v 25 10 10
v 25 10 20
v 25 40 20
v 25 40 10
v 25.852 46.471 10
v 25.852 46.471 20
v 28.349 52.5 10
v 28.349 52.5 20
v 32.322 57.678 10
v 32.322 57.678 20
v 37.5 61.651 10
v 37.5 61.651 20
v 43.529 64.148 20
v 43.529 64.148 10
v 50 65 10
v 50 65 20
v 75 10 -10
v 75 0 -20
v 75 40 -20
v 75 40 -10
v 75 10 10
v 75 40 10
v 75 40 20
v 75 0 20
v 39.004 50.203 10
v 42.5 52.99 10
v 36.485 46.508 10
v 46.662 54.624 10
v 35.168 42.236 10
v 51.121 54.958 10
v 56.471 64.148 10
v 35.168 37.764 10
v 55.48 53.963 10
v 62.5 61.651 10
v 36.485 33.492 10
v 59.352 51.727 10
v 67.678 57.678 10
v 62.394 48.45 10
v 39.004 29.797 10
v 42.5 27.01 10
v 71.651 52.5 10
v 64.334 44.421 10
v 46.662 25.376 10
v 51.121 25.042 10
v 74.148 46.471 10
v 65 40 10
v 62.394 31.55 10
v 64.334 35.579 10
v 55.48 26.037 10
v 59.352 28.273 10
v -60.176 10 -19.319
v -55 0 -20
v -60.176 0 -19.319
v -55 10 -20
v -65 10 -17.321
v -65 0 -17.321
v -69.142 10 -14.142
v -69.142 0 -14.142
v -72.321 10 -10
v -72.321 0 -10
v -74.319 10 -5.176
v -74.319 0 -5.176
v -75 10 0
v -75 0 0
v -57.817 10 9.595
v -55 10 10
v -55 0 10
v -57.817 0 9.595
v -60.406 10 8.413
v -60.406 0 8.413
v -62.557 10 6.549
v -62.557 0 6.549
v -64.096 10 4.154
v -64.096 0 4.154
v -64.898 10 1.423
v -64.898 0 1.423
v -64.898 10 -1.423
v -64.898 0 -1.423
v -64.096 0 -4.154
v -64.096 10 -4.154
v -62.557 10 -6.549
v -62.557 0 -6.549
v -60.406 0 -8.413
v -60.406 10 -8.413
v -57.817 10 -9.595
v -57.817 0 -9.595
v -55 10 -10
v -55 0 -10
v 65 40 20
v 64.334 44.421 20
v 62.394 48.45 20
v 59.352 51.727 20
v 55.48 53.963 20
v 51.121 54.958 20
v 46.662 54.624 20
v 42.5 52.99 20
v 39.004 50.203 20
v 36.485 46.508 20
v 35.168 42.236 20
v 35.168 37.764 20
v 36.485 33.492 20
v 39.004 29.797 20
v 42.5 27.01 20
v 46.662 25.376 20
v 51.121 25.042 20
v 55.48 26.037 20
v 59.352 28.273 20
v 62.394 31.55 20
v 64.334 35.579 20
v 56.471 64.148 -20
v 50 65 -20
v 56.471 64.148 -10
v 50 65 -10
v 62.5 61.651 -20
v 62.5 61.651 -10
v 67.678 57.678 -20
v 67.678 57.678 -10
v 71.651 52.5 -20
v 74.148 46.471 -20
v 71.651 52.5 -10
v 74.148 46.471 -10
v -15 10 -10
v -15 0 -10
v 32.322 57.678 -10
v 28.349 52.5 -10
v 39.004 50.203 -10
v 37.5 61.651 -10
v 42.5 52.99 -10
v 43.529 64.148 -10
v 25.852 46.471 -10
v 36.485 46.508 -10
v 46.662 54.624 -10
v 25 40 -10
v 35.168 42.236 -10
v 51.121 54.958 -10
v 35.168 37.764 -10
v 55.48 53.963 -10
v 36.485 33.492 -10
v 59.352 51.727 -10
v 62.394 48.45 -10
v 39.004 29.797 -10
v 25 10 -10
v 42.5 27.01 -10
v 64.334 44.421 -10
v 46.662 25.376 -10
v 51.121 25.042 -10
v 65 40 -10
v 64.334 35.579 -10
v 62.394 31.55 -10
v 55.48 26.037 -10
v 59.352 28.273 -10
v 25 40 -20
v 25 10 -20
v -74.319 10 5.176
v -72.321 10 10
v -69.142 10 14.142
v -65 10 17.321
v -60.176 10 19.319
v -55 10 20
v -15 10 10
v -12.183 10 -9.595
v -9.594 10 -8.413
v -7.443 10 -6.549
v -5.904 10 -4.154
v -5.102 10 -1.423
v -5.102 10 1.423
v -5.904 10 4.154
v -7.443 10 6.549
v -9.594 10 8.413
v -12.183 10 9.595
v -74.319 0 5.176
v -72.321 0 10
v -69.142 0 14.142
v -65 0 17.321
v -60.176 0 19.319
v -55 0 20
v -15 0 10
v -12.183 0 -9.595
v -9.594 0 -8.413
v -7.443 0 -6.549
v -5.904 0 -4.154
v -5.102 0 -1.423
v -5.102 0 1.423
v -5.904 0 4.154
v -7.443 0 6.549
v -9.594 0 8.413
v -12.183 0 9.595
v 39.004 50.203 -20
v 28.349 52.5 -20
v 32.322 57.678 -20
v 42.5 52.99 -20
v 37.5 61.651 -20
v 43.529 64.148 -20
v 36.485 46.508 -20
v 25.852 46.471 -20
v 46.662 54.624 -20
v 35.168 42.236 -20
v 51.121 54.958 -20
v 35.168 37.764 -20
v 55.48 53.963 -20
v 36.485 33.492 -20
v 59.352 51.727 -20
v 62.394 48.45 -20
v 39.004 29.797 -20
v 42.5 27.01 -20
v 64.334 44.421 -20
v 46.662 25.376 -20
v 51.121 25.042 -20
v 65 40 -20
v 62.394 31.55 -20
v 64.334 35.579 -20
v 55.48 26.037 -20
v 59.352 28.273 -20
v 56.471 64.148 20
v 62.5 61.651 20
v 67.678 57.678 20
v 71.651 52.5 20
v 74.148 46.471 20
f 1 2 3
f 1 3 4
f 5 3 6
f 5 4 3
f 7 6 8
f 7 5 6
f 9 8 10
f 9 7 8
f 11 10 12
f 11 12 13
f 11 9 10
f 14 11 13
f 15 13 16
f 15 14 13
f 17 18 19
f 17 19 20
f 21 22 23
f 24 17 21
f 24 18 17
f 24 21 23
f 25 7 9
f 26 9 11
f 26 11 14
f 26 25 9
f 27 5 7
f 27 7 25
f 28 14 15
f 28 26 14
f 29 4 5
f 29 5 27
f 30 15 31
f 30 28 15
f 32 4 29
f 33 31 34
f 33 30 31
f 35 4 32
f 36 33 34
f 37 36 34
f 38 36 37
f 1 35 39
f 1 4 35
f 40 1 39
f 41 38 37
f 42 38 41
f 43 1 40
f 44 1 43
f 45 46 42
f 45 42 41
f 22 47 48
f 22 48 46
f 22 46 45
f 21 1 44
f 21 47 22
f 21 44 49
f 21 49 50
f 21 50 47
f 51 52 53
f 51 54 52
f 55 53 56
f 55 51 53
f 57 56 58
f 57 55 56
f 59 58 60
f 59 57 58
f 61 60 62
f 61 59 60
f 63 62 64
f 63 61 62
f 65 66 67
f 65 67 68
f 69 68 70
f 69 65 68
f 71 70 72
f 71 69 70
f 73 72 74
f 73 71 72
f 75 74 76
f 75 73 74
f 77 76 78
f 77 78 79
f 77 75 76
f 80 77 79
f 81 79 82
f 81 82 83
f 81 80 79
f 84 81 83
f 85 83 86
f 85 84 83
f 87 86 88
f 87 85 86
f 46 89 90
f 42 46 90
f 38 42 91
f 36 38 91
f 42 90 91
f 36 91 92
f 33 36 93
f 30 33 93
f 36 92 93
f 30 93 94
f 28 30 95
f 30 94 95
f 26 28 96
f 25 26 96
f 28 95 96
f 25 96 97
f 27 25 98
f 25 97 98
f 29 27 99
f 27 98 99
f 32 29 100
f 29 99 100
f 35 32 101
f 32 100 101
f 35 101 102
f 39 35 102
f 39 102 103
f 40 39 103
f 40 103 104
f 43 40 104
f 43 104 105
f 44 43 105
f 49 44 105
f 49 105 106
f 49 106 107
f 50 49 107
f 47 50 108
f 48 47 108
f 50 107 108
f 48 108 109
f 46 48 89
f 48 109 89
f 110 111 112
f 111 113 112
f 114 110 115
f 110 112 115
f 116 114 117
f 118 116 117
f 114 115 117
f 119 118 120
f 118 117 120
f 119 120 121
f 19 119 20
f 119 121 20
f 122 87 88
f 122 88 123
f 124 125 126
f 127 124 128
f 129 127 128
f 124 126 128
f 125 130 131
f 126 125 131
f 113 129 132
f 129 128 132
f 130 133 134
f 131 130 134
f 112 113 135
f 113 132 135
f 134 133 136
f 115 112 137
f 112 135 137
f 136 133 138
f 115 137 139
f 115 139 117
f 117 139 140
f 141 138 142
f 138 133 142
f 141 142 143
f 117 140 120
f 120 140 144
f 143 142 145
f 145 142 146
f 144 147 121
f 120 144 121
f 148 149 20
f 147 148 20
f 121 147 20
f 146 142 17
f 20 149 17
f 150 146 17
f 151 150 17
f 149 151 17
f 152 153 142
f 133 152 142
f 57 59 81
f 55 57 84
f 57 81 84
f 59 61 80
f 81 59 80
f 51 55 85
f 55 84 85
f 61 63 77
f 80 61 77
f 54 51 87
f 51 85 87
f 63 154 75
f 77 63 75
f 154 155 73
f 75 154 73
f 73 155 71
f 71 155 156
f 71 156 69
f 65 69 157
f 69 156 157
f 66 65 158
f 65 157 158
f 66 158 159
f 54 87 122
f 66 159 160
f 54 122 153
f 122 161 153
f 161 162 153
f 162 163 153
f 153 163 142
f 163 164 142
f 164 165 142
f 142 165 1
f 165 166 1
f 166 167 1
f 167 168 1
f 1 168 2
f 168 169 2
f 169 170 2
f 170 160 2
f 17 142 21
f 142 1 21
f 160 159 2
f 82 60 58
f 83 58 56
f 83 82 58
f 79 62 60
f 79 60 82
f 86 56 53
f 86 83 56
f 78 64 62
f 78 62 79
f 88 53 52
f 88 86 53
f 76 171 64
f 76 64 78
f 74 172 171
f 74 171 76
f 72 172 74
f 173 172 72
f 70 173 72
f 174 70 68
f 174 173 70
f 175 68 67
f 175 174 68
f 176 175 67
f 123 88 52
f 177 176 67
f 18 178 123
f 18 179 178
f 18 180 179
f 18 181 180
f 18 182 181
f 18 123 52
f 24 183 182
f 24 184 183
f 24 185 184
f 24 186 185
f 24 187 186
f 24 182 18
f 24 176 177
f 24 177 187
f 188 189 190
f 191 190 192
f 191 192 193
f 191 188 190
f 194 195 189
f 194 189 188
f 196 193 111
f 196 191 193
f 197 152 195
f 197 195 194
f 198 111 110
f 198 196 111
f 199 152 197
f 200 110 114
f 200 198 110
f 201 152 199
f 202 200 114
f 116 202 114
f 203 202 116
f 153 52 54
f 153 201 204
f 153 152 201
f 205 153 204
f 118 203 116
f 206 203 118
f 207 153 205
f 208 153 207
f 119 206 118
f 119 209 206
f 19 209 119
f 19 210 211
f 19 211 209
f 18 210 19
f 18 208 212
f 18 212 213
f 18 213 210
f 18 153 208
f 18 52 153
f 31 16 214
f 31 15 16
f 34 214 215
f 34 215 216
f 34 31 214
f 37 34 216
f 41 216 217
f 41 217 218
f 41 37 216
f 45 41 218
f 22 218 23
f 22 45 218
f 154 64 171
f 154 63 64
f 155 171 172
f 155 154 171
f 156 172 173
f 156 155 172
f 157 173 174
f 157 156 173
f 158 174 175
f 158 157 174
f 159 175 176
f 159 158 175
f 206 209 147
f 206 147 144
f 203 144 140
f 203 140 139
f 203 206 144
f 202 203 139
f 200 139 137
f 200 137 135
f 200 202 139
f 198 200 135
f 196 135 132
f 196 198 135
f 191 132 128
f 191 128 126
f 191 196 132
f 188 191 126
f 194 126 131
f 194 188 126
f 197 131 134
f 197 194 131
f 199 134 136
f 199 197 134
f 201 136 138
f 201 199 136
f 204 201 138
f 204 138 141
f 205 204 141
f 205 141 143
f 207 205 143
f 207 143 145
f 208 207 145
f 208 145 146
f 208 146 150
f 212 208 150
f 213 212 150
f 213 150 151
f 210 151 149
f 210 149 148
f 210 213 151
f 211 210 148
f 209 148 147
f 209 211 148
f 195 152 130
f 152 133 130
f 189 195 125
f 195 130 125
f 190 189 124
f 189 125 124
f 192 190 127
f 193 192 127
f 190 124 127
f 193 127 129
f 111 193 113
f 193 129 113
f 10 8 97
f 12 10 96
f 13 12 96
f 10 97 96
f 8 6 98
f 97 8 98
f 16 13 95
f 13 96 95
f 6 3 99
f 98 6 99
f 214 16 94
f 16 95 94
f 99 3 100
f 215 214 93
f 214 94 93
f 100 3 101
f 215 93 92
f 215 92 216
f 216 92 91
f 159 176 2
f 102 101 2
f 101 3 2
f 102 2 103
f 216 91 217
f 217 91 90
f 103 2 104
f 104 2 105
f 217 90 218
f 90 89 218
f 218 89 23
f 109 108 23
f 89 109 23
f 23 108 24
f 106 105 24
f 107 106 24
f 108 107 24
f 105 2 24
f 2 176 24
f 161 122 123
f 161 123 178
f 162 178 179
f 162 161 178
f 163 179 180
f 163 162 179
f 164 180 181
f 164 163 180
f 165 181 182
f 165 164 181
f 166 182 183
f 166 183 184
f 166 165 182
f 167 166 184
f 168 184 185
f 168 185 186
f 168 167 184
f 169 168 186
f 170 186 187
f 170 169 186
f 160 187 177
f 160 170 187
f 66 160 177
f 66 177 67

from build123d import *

# Parameters (mm, degrees)
SKETCH2_W            = 150
SKETCH2_H            = 40
BOSS_EXTRUDE1_DEPTH  = 10
FILLET2_R            = 20
SKETCH10_W           = 50
SKETCH10_H           = 10
BOSS_EXTRUDE4_DEPTH  = 55
SKETCH12_R           = 15
CUT_EXTRUDE2_DEPTH   = 10
FILLET3_R            = 25
FILLET3_OF_MIRROR1_R = 25
FILLET4_R            = 20
CUT_EXTRUDE4_DEPTH   = 10


with BuildPart() as part:
    # Sketch2 → Boss-Extrude1 (new body)
    with BuildSketch(Plane(origin=(0, 0, 0), x_dir=(1, 0, 0), z_dir=(0, 1, 0))):
        Rectangle(SKETCH2_W, SKETCH2_H)
    boss_extrude1 = extrude(amount=BOSS_EXTRUDE1_DEPTH)

    # Fillet2
    fillet2_edges = [part.edges().sort_by_distance(p)[0] for p in [
        (-75, 5, 20),
        (-75, 5, -20),
    ]]
    fillet(fillet2_edges, radius=FILLET2_R - 0.0001)  # a hair under: the kernel refuses the full size

    # Sketch10 → Boss-Extrude4 (add)
    with BuildSketch(Plane(origin=(0, 10, 0), x_dir=(1, 0, 0), z_dir=(0, 1, 0))):
        with Locations((50, -15)):
            Rectangle(SKETCH10_W, SKETCH10_H)
    boss_extrude4 = extrude(amount=BOSS_EXTRUDE4_DEPTH)

    # Sketch12 → Cut-Extrude2 (cut)
    with BuildSketch(Plane.XY.offset(20)):
        with Locations((50, 40)):
            Circle(SKETCH12_R)
    cut_extrude2 = extrude(amount=-CUT_EXTRUDE2_DEPTH, mode=Mode.SUBTRACT)

    # Fillet3
    fillet3_edges = [part.edges().sort_by_distance(p)[0] for p in [
        (75, 65, 15),
        (25, 65, 15),
    ]]
    fillet(fillet3_edges, radius=FILLET3_R - 0.0001)  # a hair under: the kernel refuses the full size

    # Mirror1: Boss-Extrude1, Boss-Extrude4 across plane
    add(boss_extrude1.mirror(Plane.XY))
    add(boss_extrude4.mirror(Plane.XY))

    # Fillet3 of Mirror1
    fillet3_of_mirror1_edges = [part.edges().sort_by_distance(p)[0] for p in [
        (75, 65, -15),
        (25, 65, -15),
    ]]
    fillet(fillet3_of_mirror1_edges, radius=FILLET3_OF_MIRROR1_R - 0.0001)  # a hair under: the kernel refuses the full size

    # Mirror2: Cut-Extrude2 across plane
    add(cut_extrude2.mirror(Plane.XY), mode=Mode.SUBTRACT)

    # Fillet4
    fillet4_edges = [part.edges().sort_by_distance(p)[0] for p in [
        (-75, 5, -20),
        (-75, 5, 20),
    ]]
    fillet(fillet4_edges, radius=FILLET4_R - 0.0001)  # a hair under: the kernel refuses the full size

    # Sketch9 → Cut-Extrude4 (cut)
    with BuildSketch(Plane(origin=(0, 10, 0), x_dir=(1, 0, 0), z_dir=(0, 1, 0))):
        with BuildLine():
            Line((-55, 10), (-15, 10))
            ThreePointArc((-15, 10), (-5, 0), (-15, -10))
            Line((-15, -10), (-55, -10))
            ThreePointArc((-55, -10), (-65, 0), (-55, 10))
        make_face()
    extrude(amount=-CUT_EXTRUDE4_DEPTH, mode=Mode.SUBTRACT)


solid = part.part
